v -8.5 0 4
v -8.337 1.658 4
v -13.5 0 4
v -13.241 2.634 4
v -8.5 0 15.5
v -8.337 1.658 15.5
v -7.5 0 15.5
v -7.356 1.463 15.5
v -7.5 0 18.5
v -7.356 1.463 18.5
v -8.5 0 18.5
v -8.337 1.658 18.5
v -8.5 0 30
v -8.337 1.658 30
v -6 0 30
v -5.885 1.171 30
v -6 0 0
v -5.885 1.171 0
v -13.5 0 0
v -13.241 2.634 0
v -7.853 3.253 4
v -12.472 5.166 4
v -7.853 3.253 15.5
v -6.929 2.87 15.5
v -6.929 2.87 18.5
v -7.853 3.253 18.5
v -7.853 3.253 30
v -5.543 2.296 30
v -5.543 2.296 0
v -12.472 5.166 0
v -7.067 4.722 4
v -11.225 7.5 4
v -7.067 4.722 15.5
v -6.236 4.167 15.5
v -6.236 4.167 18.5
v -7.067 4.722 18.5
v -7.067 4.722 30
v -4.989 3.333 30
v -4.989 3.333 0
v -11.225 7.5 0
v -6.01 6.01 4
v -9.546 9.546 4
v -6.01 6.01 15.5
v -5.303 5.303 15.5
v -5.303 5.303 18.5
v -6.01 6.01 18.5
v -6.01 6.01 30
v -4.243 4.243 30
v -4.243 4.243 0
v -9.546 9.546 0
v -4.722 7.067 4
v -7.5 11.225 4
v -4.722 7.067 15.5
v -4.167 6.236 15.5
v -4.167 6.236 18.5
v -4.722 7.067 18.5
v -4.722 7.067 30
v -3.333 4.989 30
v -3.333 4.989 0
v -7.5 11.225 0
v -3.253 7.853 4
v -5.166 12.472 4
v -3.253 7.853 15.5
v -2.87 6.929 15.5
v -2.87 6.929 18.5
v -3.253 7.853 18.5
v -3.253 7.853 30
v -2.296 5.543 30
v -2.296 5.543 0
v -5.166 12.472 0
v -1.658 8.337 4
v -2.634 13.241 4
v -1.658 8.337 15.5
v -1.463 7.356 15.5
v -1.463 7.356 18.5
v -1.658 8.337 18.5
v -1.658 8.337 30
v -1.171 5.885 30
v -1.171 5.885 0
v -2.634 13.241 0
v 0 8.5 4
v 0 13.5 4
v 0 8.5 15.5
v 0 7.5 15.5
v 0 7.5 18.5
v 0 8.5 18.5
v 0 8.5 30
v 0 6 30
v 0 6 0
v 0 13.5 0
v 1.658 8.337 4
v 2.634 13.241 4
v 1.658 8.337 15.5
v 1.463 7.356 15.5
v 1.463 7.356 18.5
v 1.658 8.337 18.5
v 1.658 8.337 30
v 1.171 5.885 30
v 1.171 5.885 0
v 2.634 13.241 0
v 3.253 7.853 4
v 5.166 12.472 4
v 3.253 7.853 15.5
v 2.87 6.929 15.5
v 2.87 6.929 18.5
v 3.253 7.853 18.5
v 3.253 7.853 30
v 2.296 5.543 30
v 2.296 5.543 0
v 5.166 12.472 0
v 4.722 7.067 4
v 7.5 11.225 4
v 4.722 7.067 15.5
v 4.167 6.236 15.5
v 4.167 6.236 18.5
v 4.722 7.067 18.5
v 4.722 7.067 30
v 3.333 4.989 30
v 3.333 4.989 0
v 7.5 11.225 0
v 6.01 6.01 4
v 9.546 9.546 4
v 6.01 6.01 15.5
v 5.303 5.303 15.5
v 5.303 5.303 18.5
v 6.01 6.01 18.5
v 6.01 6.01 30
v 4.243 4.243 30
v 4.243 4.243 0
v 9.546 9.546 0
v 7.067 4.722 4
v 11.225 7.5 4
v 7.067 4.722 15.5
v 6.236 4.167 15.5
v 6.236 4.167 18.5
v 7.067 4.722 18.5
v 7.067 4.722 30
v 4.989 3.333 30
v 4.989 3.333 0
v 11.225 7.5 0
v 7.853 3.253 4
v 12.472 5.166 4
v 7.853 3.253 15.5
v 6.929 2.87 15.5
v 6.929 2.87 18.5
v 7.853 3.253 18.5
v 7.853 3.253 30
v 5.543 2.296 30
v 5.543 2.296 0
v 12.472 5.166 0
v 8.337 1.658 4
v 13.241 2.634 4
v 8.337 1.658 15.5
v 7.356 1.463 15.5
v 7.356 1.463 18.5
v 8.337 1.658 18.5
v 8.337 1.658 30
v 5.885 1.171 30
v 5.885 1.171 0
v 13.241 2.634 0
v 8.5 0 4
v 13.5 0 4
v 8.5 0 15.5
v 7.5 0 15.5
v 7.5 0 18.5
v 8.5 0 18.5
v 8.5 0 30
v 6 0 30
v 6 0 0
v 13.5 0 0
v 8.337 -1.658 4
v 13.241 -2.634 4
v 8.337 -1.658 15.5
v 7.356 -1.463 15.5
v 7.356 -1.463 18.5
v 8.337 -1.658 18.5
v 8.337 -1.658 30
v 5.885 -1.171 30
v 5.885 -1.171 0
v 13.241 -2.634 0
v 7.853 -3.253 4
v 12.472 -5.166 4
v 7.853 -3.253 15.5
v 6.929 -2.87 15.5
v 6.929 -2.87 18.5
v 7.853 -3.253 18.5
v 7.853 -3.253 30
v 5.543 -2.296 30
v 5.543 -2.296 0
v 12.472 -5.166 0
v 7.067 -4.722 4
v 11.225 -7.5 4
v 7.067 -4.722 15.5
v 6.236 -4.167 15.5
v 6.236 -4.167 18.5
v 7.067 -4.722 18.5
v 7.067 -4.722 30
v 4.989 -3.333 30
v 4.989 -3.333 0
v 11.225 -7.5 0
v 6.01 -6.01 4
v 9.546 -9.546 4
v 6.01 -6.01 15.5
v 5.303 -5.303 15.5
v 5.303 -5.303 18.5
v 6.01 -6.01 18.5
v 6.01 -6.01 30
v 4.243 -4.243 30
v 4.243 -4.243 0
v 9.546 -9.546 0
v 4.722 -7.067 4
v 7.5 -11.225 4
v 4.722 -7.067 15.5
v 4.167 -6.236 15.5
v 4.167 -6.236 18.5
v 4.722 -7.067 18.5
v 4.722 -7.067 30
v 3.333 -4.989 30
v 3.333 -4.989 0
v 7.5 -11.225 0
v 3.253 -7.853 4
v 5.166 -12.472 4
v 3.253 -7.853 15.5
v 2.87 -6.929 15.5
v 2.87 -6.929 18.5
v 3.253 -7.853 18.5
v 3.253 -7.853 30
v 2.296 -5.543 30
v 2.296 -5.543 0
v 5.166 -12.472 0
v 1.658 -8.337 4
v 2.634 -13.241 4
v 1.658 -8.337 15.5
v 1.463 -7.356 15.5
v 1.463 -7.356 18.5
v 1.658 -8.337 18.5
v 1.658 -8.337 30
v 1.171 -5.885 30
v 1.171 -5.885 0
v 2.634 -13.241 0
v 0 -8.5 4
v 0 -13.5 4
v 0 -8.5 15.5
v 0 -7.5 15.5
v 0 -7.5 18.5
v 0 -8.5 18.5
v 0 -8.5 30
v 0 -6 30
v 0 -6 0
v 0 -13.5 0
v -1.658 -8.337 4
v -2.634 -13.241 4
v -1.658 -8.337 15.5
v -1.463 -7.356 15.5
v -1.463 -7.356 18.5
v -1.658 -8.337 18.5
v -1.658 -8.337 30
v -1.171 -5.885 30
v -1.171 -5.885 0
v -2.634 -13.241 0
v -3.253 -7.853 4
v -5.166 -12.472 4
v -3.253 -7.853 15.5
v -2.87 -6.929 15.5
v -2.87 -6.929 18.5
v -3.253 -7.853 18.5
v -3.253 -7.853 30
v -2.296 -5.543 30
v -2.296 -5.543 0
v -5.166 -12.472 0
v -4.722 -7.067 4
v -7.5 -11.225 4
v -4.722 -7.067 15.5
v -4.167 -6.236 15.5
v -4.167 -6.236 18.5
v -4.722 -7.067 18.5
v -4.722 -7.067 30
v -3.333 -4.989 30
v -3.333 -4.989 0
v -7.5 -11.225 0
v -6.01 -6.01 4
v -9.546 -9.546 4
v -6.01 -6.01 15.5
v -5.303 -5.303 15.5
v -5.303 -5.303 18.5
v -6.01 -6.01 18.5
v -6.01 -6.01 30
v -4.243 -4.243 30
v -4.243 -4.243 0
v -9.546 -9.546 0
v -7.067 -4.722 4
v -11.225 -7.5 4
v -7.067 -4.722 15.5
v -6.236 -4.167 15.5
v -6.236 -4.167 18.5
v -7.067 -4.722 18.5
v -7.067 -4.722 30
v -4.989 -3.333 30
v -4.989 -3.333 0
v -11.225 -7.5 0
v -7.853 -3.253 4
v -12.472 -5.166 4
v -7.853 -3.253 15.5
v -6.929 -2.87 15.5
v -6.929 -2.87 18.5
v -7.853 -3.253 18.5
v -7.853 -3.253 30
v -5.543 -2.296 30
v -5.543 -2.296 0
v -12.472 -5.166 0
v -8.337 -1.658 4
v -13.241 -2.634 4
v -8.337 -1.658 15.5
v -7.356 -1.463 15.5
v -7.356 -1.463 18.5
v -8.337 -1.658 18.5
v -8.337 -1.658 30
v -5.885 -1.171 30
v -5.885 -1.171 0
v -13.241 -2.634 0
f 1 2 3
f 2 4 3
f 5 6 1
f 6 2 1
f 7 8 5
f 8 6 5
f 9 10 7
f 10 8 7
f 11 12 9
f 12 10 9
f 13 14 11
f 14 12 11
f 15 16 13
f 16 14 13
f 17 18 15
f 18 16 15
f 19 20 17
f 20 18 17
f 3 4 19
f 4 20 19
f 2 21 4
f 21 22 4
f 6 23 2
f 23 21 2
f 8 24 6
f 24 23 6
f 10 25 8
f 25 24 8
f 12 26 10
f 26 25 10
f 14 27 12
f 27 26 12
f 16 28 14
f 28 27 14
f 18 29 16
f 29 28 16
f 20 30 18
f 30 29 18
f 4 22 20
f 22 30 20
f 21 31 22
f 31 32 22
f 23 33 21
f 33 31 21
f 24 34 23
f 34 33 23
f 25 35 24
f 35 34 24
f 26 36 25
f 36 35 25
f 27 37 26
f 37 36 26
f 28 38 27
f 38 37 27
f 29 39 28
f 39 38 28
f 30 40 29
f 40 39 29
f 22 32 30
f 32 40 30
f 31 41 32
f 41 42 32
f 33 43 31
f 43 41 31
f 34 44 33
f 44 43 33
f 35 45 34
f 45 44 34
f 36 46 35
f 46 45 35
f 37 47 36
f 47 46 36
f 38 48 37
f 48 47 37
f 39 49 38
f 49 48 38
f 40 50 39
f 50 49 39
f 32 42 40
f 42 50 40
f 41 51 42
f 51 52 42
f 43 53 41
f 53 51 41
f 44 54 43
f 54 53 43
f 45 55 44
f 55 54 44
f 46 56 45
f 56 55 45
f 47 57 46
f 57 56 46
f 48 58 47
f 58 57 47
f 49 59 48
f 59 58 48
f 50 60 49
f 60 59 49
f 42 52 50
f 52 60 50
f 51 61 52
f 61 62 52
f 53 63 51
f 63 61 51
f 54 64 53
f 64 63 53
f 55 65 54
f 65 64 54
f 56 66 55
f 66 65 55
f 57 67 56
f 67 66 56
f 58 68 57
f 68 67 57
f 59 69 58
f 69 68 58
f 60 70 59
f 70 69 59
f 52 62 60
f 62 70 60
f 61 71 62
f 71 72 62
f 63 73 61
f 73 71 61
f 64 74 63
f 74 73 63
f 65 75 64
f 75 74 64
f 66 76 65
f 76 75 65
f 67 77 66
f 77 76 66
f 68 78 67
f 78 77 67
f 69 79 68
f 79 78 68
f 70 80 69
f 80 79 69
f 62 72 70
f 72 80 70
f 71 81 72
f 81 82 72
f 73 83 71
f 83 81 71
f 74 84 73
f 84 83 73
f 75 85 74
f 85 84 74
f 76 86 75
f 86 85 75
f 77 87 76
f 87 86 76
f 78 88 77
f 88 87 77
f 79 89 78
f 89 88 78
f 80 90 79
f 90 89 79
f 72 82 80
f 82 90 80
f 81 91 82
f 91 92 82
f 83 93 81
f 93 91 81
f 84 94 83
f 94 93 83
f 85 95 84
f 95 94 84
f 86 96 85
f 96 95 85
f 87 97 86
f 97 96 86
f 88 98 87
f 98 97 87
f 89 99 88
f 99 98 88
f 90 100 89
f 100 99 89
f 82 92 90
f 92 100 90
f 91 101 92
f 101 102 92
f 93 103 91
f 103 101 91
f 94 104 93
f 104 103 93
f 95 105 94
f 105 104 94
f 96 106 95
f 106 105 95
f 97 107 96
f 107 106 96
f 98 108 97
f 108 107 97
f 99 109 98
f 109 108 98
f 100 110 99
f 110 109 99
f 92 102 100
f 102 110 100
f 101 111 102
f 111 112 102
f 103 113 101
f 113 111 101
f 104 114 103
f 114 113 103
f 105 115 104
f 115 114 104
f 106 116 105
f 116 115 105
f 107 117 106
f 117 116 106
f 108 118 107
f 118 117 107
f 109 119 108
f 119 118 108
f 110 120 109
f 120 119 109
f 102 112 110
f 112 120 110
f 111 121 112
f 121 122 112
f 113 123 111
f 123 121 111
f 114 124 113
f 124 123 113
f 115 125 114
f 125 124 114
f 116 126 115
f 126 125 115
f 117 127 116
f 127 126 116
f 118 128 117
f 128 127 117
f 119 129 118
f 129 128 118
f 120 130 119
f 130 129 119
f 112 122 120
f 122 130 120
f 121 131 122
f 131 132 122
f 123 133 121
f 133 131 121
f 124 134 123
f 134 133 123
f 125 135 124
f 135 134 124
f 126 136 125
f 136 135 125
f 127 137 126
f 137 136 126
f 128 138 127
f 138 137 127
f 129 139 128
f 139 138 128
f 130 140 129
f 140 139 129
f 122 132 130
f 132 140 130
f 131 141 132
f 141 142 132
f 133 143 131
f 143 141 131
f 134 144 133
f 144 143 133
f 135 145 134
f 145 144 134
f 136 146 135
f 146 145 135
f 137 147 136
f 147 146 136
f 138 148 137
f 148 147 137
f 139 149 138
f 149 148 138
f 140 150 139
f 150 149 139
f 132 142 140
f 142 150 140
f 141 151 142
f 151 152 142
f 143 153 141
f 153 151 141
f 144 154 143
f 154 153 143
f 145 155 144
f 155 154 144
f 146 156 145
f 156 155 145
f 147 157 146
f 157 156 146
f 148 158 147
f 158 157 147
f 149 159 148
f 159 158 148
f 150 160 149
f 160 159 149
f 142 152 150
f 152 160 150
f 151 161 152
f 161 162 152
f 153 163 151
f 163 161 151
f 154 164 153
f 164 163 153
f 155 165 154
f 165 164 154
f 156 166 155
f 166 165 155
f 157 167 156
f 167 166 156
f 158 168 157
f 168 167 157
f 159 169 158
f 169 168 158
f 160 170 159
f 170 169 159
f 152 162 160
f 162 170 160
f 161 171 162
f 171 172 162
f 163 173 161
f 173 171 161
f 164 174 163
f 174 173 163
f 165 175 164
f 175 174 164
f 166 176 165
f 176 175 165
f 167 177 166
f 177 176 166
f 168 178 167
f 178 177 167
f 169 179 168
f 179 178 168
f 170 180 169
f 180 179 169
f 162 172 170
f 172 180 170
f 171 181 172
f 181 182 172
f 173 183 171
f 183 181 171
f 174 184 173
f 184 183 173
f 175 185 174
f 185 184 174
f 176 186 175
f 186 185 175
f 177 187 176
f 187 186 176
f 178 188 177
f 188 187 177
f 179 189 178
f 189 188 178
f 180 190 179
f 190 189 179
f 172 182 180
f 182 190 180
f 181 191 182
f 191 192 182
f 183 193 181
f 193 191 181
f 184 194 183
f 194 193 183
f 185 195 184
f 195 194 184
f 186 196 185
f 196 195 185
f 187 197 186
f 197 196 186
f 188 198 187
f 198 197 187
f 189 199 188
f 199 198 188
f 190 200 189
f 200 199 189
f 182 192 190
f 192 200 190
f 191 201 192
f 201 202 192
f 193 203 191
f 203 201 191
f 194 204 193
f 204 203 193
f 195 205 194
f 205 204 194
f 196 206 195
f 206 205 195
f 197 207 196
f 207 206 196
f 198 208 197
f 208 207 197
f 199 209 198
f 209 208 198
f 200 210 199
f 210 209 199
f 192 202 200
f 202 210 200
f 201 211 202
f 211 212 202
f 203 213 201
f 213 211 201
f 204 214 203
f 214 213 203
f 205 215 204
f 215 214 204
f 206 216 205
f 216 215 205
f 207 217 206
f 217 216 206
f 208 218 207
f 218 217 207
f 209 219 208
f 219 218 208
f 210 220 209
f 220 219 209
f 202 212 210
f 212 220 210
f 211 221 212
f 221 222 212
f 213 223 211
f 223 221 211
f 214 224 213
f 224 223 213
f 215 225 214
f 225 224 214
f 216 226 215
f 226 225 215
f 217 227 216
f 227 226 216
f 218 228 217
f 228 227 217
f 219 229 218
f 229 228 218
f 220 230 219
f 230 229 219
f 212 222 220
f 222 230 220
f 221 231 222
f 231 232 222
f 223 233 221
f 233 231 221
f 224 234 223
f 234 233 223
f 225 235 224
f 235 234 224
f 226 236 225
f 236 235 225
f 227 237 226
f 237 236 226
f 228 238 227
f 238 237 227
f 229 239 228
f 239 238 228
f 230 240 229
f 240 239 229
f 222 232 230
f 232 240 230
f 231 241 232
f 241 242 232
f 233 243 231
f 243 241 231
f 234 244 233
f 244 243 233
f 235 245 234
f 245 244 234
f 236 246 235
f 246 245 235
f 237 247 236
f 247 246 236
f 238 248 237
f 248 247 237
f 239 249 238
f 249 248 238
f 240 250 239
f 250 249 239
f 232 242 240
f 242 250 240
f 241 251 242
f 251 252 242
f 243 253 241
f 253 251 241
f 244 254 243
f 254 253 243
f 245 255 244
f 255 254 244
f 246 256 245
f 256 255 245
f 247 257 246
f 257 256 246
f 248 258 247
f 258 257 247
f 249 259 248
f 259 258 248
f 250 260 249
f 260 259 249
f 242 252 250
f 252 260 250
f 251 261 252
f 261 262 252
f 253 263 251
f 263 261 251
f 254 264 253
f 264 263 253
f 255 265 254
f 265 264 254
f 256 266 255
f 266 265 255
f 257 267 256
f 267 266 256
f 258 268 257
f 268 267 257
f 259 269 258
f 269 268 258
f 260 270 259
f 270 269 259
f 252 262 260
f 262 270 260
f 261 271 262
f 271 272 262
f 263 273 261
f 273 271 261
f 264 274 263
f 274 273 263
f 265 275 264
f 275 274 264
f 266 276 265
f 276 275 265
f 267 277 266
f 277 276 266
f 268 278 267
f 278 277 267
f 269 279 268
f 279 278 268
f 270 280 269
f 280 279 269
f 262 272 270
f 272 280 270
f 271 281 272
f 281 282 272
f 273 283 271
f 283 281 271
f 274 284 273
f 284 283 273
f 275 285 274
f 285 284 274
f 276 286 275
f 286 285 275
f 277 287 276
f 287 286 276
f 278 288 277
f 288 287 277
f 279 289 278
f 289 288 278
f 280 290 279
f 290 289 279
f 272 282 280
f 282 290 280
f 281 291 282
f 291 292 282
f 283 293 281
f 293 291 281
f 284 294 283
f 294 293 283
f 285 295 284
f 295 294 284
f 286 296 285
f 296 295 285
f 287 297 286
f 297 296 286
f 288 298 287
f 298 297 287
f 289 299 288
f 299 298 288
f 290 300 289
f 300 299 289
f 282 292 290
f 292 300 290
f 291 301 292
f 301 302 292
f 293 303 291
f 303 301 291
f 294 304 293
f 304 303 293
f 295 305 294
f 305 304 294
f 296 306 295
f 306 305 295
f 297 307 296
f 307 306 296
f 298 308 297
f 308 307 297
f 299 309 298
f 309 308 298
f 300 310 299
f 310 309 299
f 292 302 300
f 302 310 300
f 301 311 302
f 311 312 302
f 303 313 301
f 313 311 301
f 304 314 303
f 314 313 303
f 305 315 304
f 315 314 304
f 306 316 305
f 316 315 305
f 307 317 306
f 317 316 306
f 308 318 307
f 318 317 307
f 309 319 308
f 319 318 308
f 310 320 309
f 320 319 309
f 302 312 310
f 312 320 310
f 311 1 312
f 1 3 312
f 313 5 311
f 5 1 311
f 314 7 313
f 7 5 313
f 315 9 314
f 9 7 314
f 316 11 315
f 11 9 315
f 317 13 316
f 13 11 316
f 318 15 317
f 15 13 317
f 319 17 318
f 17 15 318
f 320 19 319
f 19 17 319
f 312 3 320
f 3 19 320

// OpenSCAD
$fn = 32;

// ----------------------------------------------------------------------
// Grooved revolve: flanged, bore R6
// ----------------------------------------------------------------------

// --- parameters (mm) ---
bore_r = 6;               // bore radius
outer_r = 8.5;            // outer radius of the body
total_h = 30;             // overall height, Z
wall = 2.5;               // radial wall thickness
groove_w = 3;             // groove width
groove_d = 1;             // groove depth
grooves = 1;              // number of outer grooves
flange_r = 13.5;          // flange radius
flange_h = 4;             // flange height

bbox_x = 2 * flange_r;  // full diameter
bore_d = 2 * bore_r;  // bore diameter
body_d = 2 * outer_r;  // body diameter
flange_d = 2 * flange_r;  // flange diameter
revolve_angle = 360;  // full turn around the Z axis

profile = [[6, 0], [8.5, 0], [13.5, 0], [13.5, 4], [8.5, 4], [8.5, 15.5], [7.5, 15.5], [7.5, 18.5], [8.5, 18.5], [8.5, 30], [6, 30]];  // primary outline, 11 points, counter clockwise

// --- the one profile operation ---
rotate_extrude(angle = revolve_angle) polygon(points = profile);
